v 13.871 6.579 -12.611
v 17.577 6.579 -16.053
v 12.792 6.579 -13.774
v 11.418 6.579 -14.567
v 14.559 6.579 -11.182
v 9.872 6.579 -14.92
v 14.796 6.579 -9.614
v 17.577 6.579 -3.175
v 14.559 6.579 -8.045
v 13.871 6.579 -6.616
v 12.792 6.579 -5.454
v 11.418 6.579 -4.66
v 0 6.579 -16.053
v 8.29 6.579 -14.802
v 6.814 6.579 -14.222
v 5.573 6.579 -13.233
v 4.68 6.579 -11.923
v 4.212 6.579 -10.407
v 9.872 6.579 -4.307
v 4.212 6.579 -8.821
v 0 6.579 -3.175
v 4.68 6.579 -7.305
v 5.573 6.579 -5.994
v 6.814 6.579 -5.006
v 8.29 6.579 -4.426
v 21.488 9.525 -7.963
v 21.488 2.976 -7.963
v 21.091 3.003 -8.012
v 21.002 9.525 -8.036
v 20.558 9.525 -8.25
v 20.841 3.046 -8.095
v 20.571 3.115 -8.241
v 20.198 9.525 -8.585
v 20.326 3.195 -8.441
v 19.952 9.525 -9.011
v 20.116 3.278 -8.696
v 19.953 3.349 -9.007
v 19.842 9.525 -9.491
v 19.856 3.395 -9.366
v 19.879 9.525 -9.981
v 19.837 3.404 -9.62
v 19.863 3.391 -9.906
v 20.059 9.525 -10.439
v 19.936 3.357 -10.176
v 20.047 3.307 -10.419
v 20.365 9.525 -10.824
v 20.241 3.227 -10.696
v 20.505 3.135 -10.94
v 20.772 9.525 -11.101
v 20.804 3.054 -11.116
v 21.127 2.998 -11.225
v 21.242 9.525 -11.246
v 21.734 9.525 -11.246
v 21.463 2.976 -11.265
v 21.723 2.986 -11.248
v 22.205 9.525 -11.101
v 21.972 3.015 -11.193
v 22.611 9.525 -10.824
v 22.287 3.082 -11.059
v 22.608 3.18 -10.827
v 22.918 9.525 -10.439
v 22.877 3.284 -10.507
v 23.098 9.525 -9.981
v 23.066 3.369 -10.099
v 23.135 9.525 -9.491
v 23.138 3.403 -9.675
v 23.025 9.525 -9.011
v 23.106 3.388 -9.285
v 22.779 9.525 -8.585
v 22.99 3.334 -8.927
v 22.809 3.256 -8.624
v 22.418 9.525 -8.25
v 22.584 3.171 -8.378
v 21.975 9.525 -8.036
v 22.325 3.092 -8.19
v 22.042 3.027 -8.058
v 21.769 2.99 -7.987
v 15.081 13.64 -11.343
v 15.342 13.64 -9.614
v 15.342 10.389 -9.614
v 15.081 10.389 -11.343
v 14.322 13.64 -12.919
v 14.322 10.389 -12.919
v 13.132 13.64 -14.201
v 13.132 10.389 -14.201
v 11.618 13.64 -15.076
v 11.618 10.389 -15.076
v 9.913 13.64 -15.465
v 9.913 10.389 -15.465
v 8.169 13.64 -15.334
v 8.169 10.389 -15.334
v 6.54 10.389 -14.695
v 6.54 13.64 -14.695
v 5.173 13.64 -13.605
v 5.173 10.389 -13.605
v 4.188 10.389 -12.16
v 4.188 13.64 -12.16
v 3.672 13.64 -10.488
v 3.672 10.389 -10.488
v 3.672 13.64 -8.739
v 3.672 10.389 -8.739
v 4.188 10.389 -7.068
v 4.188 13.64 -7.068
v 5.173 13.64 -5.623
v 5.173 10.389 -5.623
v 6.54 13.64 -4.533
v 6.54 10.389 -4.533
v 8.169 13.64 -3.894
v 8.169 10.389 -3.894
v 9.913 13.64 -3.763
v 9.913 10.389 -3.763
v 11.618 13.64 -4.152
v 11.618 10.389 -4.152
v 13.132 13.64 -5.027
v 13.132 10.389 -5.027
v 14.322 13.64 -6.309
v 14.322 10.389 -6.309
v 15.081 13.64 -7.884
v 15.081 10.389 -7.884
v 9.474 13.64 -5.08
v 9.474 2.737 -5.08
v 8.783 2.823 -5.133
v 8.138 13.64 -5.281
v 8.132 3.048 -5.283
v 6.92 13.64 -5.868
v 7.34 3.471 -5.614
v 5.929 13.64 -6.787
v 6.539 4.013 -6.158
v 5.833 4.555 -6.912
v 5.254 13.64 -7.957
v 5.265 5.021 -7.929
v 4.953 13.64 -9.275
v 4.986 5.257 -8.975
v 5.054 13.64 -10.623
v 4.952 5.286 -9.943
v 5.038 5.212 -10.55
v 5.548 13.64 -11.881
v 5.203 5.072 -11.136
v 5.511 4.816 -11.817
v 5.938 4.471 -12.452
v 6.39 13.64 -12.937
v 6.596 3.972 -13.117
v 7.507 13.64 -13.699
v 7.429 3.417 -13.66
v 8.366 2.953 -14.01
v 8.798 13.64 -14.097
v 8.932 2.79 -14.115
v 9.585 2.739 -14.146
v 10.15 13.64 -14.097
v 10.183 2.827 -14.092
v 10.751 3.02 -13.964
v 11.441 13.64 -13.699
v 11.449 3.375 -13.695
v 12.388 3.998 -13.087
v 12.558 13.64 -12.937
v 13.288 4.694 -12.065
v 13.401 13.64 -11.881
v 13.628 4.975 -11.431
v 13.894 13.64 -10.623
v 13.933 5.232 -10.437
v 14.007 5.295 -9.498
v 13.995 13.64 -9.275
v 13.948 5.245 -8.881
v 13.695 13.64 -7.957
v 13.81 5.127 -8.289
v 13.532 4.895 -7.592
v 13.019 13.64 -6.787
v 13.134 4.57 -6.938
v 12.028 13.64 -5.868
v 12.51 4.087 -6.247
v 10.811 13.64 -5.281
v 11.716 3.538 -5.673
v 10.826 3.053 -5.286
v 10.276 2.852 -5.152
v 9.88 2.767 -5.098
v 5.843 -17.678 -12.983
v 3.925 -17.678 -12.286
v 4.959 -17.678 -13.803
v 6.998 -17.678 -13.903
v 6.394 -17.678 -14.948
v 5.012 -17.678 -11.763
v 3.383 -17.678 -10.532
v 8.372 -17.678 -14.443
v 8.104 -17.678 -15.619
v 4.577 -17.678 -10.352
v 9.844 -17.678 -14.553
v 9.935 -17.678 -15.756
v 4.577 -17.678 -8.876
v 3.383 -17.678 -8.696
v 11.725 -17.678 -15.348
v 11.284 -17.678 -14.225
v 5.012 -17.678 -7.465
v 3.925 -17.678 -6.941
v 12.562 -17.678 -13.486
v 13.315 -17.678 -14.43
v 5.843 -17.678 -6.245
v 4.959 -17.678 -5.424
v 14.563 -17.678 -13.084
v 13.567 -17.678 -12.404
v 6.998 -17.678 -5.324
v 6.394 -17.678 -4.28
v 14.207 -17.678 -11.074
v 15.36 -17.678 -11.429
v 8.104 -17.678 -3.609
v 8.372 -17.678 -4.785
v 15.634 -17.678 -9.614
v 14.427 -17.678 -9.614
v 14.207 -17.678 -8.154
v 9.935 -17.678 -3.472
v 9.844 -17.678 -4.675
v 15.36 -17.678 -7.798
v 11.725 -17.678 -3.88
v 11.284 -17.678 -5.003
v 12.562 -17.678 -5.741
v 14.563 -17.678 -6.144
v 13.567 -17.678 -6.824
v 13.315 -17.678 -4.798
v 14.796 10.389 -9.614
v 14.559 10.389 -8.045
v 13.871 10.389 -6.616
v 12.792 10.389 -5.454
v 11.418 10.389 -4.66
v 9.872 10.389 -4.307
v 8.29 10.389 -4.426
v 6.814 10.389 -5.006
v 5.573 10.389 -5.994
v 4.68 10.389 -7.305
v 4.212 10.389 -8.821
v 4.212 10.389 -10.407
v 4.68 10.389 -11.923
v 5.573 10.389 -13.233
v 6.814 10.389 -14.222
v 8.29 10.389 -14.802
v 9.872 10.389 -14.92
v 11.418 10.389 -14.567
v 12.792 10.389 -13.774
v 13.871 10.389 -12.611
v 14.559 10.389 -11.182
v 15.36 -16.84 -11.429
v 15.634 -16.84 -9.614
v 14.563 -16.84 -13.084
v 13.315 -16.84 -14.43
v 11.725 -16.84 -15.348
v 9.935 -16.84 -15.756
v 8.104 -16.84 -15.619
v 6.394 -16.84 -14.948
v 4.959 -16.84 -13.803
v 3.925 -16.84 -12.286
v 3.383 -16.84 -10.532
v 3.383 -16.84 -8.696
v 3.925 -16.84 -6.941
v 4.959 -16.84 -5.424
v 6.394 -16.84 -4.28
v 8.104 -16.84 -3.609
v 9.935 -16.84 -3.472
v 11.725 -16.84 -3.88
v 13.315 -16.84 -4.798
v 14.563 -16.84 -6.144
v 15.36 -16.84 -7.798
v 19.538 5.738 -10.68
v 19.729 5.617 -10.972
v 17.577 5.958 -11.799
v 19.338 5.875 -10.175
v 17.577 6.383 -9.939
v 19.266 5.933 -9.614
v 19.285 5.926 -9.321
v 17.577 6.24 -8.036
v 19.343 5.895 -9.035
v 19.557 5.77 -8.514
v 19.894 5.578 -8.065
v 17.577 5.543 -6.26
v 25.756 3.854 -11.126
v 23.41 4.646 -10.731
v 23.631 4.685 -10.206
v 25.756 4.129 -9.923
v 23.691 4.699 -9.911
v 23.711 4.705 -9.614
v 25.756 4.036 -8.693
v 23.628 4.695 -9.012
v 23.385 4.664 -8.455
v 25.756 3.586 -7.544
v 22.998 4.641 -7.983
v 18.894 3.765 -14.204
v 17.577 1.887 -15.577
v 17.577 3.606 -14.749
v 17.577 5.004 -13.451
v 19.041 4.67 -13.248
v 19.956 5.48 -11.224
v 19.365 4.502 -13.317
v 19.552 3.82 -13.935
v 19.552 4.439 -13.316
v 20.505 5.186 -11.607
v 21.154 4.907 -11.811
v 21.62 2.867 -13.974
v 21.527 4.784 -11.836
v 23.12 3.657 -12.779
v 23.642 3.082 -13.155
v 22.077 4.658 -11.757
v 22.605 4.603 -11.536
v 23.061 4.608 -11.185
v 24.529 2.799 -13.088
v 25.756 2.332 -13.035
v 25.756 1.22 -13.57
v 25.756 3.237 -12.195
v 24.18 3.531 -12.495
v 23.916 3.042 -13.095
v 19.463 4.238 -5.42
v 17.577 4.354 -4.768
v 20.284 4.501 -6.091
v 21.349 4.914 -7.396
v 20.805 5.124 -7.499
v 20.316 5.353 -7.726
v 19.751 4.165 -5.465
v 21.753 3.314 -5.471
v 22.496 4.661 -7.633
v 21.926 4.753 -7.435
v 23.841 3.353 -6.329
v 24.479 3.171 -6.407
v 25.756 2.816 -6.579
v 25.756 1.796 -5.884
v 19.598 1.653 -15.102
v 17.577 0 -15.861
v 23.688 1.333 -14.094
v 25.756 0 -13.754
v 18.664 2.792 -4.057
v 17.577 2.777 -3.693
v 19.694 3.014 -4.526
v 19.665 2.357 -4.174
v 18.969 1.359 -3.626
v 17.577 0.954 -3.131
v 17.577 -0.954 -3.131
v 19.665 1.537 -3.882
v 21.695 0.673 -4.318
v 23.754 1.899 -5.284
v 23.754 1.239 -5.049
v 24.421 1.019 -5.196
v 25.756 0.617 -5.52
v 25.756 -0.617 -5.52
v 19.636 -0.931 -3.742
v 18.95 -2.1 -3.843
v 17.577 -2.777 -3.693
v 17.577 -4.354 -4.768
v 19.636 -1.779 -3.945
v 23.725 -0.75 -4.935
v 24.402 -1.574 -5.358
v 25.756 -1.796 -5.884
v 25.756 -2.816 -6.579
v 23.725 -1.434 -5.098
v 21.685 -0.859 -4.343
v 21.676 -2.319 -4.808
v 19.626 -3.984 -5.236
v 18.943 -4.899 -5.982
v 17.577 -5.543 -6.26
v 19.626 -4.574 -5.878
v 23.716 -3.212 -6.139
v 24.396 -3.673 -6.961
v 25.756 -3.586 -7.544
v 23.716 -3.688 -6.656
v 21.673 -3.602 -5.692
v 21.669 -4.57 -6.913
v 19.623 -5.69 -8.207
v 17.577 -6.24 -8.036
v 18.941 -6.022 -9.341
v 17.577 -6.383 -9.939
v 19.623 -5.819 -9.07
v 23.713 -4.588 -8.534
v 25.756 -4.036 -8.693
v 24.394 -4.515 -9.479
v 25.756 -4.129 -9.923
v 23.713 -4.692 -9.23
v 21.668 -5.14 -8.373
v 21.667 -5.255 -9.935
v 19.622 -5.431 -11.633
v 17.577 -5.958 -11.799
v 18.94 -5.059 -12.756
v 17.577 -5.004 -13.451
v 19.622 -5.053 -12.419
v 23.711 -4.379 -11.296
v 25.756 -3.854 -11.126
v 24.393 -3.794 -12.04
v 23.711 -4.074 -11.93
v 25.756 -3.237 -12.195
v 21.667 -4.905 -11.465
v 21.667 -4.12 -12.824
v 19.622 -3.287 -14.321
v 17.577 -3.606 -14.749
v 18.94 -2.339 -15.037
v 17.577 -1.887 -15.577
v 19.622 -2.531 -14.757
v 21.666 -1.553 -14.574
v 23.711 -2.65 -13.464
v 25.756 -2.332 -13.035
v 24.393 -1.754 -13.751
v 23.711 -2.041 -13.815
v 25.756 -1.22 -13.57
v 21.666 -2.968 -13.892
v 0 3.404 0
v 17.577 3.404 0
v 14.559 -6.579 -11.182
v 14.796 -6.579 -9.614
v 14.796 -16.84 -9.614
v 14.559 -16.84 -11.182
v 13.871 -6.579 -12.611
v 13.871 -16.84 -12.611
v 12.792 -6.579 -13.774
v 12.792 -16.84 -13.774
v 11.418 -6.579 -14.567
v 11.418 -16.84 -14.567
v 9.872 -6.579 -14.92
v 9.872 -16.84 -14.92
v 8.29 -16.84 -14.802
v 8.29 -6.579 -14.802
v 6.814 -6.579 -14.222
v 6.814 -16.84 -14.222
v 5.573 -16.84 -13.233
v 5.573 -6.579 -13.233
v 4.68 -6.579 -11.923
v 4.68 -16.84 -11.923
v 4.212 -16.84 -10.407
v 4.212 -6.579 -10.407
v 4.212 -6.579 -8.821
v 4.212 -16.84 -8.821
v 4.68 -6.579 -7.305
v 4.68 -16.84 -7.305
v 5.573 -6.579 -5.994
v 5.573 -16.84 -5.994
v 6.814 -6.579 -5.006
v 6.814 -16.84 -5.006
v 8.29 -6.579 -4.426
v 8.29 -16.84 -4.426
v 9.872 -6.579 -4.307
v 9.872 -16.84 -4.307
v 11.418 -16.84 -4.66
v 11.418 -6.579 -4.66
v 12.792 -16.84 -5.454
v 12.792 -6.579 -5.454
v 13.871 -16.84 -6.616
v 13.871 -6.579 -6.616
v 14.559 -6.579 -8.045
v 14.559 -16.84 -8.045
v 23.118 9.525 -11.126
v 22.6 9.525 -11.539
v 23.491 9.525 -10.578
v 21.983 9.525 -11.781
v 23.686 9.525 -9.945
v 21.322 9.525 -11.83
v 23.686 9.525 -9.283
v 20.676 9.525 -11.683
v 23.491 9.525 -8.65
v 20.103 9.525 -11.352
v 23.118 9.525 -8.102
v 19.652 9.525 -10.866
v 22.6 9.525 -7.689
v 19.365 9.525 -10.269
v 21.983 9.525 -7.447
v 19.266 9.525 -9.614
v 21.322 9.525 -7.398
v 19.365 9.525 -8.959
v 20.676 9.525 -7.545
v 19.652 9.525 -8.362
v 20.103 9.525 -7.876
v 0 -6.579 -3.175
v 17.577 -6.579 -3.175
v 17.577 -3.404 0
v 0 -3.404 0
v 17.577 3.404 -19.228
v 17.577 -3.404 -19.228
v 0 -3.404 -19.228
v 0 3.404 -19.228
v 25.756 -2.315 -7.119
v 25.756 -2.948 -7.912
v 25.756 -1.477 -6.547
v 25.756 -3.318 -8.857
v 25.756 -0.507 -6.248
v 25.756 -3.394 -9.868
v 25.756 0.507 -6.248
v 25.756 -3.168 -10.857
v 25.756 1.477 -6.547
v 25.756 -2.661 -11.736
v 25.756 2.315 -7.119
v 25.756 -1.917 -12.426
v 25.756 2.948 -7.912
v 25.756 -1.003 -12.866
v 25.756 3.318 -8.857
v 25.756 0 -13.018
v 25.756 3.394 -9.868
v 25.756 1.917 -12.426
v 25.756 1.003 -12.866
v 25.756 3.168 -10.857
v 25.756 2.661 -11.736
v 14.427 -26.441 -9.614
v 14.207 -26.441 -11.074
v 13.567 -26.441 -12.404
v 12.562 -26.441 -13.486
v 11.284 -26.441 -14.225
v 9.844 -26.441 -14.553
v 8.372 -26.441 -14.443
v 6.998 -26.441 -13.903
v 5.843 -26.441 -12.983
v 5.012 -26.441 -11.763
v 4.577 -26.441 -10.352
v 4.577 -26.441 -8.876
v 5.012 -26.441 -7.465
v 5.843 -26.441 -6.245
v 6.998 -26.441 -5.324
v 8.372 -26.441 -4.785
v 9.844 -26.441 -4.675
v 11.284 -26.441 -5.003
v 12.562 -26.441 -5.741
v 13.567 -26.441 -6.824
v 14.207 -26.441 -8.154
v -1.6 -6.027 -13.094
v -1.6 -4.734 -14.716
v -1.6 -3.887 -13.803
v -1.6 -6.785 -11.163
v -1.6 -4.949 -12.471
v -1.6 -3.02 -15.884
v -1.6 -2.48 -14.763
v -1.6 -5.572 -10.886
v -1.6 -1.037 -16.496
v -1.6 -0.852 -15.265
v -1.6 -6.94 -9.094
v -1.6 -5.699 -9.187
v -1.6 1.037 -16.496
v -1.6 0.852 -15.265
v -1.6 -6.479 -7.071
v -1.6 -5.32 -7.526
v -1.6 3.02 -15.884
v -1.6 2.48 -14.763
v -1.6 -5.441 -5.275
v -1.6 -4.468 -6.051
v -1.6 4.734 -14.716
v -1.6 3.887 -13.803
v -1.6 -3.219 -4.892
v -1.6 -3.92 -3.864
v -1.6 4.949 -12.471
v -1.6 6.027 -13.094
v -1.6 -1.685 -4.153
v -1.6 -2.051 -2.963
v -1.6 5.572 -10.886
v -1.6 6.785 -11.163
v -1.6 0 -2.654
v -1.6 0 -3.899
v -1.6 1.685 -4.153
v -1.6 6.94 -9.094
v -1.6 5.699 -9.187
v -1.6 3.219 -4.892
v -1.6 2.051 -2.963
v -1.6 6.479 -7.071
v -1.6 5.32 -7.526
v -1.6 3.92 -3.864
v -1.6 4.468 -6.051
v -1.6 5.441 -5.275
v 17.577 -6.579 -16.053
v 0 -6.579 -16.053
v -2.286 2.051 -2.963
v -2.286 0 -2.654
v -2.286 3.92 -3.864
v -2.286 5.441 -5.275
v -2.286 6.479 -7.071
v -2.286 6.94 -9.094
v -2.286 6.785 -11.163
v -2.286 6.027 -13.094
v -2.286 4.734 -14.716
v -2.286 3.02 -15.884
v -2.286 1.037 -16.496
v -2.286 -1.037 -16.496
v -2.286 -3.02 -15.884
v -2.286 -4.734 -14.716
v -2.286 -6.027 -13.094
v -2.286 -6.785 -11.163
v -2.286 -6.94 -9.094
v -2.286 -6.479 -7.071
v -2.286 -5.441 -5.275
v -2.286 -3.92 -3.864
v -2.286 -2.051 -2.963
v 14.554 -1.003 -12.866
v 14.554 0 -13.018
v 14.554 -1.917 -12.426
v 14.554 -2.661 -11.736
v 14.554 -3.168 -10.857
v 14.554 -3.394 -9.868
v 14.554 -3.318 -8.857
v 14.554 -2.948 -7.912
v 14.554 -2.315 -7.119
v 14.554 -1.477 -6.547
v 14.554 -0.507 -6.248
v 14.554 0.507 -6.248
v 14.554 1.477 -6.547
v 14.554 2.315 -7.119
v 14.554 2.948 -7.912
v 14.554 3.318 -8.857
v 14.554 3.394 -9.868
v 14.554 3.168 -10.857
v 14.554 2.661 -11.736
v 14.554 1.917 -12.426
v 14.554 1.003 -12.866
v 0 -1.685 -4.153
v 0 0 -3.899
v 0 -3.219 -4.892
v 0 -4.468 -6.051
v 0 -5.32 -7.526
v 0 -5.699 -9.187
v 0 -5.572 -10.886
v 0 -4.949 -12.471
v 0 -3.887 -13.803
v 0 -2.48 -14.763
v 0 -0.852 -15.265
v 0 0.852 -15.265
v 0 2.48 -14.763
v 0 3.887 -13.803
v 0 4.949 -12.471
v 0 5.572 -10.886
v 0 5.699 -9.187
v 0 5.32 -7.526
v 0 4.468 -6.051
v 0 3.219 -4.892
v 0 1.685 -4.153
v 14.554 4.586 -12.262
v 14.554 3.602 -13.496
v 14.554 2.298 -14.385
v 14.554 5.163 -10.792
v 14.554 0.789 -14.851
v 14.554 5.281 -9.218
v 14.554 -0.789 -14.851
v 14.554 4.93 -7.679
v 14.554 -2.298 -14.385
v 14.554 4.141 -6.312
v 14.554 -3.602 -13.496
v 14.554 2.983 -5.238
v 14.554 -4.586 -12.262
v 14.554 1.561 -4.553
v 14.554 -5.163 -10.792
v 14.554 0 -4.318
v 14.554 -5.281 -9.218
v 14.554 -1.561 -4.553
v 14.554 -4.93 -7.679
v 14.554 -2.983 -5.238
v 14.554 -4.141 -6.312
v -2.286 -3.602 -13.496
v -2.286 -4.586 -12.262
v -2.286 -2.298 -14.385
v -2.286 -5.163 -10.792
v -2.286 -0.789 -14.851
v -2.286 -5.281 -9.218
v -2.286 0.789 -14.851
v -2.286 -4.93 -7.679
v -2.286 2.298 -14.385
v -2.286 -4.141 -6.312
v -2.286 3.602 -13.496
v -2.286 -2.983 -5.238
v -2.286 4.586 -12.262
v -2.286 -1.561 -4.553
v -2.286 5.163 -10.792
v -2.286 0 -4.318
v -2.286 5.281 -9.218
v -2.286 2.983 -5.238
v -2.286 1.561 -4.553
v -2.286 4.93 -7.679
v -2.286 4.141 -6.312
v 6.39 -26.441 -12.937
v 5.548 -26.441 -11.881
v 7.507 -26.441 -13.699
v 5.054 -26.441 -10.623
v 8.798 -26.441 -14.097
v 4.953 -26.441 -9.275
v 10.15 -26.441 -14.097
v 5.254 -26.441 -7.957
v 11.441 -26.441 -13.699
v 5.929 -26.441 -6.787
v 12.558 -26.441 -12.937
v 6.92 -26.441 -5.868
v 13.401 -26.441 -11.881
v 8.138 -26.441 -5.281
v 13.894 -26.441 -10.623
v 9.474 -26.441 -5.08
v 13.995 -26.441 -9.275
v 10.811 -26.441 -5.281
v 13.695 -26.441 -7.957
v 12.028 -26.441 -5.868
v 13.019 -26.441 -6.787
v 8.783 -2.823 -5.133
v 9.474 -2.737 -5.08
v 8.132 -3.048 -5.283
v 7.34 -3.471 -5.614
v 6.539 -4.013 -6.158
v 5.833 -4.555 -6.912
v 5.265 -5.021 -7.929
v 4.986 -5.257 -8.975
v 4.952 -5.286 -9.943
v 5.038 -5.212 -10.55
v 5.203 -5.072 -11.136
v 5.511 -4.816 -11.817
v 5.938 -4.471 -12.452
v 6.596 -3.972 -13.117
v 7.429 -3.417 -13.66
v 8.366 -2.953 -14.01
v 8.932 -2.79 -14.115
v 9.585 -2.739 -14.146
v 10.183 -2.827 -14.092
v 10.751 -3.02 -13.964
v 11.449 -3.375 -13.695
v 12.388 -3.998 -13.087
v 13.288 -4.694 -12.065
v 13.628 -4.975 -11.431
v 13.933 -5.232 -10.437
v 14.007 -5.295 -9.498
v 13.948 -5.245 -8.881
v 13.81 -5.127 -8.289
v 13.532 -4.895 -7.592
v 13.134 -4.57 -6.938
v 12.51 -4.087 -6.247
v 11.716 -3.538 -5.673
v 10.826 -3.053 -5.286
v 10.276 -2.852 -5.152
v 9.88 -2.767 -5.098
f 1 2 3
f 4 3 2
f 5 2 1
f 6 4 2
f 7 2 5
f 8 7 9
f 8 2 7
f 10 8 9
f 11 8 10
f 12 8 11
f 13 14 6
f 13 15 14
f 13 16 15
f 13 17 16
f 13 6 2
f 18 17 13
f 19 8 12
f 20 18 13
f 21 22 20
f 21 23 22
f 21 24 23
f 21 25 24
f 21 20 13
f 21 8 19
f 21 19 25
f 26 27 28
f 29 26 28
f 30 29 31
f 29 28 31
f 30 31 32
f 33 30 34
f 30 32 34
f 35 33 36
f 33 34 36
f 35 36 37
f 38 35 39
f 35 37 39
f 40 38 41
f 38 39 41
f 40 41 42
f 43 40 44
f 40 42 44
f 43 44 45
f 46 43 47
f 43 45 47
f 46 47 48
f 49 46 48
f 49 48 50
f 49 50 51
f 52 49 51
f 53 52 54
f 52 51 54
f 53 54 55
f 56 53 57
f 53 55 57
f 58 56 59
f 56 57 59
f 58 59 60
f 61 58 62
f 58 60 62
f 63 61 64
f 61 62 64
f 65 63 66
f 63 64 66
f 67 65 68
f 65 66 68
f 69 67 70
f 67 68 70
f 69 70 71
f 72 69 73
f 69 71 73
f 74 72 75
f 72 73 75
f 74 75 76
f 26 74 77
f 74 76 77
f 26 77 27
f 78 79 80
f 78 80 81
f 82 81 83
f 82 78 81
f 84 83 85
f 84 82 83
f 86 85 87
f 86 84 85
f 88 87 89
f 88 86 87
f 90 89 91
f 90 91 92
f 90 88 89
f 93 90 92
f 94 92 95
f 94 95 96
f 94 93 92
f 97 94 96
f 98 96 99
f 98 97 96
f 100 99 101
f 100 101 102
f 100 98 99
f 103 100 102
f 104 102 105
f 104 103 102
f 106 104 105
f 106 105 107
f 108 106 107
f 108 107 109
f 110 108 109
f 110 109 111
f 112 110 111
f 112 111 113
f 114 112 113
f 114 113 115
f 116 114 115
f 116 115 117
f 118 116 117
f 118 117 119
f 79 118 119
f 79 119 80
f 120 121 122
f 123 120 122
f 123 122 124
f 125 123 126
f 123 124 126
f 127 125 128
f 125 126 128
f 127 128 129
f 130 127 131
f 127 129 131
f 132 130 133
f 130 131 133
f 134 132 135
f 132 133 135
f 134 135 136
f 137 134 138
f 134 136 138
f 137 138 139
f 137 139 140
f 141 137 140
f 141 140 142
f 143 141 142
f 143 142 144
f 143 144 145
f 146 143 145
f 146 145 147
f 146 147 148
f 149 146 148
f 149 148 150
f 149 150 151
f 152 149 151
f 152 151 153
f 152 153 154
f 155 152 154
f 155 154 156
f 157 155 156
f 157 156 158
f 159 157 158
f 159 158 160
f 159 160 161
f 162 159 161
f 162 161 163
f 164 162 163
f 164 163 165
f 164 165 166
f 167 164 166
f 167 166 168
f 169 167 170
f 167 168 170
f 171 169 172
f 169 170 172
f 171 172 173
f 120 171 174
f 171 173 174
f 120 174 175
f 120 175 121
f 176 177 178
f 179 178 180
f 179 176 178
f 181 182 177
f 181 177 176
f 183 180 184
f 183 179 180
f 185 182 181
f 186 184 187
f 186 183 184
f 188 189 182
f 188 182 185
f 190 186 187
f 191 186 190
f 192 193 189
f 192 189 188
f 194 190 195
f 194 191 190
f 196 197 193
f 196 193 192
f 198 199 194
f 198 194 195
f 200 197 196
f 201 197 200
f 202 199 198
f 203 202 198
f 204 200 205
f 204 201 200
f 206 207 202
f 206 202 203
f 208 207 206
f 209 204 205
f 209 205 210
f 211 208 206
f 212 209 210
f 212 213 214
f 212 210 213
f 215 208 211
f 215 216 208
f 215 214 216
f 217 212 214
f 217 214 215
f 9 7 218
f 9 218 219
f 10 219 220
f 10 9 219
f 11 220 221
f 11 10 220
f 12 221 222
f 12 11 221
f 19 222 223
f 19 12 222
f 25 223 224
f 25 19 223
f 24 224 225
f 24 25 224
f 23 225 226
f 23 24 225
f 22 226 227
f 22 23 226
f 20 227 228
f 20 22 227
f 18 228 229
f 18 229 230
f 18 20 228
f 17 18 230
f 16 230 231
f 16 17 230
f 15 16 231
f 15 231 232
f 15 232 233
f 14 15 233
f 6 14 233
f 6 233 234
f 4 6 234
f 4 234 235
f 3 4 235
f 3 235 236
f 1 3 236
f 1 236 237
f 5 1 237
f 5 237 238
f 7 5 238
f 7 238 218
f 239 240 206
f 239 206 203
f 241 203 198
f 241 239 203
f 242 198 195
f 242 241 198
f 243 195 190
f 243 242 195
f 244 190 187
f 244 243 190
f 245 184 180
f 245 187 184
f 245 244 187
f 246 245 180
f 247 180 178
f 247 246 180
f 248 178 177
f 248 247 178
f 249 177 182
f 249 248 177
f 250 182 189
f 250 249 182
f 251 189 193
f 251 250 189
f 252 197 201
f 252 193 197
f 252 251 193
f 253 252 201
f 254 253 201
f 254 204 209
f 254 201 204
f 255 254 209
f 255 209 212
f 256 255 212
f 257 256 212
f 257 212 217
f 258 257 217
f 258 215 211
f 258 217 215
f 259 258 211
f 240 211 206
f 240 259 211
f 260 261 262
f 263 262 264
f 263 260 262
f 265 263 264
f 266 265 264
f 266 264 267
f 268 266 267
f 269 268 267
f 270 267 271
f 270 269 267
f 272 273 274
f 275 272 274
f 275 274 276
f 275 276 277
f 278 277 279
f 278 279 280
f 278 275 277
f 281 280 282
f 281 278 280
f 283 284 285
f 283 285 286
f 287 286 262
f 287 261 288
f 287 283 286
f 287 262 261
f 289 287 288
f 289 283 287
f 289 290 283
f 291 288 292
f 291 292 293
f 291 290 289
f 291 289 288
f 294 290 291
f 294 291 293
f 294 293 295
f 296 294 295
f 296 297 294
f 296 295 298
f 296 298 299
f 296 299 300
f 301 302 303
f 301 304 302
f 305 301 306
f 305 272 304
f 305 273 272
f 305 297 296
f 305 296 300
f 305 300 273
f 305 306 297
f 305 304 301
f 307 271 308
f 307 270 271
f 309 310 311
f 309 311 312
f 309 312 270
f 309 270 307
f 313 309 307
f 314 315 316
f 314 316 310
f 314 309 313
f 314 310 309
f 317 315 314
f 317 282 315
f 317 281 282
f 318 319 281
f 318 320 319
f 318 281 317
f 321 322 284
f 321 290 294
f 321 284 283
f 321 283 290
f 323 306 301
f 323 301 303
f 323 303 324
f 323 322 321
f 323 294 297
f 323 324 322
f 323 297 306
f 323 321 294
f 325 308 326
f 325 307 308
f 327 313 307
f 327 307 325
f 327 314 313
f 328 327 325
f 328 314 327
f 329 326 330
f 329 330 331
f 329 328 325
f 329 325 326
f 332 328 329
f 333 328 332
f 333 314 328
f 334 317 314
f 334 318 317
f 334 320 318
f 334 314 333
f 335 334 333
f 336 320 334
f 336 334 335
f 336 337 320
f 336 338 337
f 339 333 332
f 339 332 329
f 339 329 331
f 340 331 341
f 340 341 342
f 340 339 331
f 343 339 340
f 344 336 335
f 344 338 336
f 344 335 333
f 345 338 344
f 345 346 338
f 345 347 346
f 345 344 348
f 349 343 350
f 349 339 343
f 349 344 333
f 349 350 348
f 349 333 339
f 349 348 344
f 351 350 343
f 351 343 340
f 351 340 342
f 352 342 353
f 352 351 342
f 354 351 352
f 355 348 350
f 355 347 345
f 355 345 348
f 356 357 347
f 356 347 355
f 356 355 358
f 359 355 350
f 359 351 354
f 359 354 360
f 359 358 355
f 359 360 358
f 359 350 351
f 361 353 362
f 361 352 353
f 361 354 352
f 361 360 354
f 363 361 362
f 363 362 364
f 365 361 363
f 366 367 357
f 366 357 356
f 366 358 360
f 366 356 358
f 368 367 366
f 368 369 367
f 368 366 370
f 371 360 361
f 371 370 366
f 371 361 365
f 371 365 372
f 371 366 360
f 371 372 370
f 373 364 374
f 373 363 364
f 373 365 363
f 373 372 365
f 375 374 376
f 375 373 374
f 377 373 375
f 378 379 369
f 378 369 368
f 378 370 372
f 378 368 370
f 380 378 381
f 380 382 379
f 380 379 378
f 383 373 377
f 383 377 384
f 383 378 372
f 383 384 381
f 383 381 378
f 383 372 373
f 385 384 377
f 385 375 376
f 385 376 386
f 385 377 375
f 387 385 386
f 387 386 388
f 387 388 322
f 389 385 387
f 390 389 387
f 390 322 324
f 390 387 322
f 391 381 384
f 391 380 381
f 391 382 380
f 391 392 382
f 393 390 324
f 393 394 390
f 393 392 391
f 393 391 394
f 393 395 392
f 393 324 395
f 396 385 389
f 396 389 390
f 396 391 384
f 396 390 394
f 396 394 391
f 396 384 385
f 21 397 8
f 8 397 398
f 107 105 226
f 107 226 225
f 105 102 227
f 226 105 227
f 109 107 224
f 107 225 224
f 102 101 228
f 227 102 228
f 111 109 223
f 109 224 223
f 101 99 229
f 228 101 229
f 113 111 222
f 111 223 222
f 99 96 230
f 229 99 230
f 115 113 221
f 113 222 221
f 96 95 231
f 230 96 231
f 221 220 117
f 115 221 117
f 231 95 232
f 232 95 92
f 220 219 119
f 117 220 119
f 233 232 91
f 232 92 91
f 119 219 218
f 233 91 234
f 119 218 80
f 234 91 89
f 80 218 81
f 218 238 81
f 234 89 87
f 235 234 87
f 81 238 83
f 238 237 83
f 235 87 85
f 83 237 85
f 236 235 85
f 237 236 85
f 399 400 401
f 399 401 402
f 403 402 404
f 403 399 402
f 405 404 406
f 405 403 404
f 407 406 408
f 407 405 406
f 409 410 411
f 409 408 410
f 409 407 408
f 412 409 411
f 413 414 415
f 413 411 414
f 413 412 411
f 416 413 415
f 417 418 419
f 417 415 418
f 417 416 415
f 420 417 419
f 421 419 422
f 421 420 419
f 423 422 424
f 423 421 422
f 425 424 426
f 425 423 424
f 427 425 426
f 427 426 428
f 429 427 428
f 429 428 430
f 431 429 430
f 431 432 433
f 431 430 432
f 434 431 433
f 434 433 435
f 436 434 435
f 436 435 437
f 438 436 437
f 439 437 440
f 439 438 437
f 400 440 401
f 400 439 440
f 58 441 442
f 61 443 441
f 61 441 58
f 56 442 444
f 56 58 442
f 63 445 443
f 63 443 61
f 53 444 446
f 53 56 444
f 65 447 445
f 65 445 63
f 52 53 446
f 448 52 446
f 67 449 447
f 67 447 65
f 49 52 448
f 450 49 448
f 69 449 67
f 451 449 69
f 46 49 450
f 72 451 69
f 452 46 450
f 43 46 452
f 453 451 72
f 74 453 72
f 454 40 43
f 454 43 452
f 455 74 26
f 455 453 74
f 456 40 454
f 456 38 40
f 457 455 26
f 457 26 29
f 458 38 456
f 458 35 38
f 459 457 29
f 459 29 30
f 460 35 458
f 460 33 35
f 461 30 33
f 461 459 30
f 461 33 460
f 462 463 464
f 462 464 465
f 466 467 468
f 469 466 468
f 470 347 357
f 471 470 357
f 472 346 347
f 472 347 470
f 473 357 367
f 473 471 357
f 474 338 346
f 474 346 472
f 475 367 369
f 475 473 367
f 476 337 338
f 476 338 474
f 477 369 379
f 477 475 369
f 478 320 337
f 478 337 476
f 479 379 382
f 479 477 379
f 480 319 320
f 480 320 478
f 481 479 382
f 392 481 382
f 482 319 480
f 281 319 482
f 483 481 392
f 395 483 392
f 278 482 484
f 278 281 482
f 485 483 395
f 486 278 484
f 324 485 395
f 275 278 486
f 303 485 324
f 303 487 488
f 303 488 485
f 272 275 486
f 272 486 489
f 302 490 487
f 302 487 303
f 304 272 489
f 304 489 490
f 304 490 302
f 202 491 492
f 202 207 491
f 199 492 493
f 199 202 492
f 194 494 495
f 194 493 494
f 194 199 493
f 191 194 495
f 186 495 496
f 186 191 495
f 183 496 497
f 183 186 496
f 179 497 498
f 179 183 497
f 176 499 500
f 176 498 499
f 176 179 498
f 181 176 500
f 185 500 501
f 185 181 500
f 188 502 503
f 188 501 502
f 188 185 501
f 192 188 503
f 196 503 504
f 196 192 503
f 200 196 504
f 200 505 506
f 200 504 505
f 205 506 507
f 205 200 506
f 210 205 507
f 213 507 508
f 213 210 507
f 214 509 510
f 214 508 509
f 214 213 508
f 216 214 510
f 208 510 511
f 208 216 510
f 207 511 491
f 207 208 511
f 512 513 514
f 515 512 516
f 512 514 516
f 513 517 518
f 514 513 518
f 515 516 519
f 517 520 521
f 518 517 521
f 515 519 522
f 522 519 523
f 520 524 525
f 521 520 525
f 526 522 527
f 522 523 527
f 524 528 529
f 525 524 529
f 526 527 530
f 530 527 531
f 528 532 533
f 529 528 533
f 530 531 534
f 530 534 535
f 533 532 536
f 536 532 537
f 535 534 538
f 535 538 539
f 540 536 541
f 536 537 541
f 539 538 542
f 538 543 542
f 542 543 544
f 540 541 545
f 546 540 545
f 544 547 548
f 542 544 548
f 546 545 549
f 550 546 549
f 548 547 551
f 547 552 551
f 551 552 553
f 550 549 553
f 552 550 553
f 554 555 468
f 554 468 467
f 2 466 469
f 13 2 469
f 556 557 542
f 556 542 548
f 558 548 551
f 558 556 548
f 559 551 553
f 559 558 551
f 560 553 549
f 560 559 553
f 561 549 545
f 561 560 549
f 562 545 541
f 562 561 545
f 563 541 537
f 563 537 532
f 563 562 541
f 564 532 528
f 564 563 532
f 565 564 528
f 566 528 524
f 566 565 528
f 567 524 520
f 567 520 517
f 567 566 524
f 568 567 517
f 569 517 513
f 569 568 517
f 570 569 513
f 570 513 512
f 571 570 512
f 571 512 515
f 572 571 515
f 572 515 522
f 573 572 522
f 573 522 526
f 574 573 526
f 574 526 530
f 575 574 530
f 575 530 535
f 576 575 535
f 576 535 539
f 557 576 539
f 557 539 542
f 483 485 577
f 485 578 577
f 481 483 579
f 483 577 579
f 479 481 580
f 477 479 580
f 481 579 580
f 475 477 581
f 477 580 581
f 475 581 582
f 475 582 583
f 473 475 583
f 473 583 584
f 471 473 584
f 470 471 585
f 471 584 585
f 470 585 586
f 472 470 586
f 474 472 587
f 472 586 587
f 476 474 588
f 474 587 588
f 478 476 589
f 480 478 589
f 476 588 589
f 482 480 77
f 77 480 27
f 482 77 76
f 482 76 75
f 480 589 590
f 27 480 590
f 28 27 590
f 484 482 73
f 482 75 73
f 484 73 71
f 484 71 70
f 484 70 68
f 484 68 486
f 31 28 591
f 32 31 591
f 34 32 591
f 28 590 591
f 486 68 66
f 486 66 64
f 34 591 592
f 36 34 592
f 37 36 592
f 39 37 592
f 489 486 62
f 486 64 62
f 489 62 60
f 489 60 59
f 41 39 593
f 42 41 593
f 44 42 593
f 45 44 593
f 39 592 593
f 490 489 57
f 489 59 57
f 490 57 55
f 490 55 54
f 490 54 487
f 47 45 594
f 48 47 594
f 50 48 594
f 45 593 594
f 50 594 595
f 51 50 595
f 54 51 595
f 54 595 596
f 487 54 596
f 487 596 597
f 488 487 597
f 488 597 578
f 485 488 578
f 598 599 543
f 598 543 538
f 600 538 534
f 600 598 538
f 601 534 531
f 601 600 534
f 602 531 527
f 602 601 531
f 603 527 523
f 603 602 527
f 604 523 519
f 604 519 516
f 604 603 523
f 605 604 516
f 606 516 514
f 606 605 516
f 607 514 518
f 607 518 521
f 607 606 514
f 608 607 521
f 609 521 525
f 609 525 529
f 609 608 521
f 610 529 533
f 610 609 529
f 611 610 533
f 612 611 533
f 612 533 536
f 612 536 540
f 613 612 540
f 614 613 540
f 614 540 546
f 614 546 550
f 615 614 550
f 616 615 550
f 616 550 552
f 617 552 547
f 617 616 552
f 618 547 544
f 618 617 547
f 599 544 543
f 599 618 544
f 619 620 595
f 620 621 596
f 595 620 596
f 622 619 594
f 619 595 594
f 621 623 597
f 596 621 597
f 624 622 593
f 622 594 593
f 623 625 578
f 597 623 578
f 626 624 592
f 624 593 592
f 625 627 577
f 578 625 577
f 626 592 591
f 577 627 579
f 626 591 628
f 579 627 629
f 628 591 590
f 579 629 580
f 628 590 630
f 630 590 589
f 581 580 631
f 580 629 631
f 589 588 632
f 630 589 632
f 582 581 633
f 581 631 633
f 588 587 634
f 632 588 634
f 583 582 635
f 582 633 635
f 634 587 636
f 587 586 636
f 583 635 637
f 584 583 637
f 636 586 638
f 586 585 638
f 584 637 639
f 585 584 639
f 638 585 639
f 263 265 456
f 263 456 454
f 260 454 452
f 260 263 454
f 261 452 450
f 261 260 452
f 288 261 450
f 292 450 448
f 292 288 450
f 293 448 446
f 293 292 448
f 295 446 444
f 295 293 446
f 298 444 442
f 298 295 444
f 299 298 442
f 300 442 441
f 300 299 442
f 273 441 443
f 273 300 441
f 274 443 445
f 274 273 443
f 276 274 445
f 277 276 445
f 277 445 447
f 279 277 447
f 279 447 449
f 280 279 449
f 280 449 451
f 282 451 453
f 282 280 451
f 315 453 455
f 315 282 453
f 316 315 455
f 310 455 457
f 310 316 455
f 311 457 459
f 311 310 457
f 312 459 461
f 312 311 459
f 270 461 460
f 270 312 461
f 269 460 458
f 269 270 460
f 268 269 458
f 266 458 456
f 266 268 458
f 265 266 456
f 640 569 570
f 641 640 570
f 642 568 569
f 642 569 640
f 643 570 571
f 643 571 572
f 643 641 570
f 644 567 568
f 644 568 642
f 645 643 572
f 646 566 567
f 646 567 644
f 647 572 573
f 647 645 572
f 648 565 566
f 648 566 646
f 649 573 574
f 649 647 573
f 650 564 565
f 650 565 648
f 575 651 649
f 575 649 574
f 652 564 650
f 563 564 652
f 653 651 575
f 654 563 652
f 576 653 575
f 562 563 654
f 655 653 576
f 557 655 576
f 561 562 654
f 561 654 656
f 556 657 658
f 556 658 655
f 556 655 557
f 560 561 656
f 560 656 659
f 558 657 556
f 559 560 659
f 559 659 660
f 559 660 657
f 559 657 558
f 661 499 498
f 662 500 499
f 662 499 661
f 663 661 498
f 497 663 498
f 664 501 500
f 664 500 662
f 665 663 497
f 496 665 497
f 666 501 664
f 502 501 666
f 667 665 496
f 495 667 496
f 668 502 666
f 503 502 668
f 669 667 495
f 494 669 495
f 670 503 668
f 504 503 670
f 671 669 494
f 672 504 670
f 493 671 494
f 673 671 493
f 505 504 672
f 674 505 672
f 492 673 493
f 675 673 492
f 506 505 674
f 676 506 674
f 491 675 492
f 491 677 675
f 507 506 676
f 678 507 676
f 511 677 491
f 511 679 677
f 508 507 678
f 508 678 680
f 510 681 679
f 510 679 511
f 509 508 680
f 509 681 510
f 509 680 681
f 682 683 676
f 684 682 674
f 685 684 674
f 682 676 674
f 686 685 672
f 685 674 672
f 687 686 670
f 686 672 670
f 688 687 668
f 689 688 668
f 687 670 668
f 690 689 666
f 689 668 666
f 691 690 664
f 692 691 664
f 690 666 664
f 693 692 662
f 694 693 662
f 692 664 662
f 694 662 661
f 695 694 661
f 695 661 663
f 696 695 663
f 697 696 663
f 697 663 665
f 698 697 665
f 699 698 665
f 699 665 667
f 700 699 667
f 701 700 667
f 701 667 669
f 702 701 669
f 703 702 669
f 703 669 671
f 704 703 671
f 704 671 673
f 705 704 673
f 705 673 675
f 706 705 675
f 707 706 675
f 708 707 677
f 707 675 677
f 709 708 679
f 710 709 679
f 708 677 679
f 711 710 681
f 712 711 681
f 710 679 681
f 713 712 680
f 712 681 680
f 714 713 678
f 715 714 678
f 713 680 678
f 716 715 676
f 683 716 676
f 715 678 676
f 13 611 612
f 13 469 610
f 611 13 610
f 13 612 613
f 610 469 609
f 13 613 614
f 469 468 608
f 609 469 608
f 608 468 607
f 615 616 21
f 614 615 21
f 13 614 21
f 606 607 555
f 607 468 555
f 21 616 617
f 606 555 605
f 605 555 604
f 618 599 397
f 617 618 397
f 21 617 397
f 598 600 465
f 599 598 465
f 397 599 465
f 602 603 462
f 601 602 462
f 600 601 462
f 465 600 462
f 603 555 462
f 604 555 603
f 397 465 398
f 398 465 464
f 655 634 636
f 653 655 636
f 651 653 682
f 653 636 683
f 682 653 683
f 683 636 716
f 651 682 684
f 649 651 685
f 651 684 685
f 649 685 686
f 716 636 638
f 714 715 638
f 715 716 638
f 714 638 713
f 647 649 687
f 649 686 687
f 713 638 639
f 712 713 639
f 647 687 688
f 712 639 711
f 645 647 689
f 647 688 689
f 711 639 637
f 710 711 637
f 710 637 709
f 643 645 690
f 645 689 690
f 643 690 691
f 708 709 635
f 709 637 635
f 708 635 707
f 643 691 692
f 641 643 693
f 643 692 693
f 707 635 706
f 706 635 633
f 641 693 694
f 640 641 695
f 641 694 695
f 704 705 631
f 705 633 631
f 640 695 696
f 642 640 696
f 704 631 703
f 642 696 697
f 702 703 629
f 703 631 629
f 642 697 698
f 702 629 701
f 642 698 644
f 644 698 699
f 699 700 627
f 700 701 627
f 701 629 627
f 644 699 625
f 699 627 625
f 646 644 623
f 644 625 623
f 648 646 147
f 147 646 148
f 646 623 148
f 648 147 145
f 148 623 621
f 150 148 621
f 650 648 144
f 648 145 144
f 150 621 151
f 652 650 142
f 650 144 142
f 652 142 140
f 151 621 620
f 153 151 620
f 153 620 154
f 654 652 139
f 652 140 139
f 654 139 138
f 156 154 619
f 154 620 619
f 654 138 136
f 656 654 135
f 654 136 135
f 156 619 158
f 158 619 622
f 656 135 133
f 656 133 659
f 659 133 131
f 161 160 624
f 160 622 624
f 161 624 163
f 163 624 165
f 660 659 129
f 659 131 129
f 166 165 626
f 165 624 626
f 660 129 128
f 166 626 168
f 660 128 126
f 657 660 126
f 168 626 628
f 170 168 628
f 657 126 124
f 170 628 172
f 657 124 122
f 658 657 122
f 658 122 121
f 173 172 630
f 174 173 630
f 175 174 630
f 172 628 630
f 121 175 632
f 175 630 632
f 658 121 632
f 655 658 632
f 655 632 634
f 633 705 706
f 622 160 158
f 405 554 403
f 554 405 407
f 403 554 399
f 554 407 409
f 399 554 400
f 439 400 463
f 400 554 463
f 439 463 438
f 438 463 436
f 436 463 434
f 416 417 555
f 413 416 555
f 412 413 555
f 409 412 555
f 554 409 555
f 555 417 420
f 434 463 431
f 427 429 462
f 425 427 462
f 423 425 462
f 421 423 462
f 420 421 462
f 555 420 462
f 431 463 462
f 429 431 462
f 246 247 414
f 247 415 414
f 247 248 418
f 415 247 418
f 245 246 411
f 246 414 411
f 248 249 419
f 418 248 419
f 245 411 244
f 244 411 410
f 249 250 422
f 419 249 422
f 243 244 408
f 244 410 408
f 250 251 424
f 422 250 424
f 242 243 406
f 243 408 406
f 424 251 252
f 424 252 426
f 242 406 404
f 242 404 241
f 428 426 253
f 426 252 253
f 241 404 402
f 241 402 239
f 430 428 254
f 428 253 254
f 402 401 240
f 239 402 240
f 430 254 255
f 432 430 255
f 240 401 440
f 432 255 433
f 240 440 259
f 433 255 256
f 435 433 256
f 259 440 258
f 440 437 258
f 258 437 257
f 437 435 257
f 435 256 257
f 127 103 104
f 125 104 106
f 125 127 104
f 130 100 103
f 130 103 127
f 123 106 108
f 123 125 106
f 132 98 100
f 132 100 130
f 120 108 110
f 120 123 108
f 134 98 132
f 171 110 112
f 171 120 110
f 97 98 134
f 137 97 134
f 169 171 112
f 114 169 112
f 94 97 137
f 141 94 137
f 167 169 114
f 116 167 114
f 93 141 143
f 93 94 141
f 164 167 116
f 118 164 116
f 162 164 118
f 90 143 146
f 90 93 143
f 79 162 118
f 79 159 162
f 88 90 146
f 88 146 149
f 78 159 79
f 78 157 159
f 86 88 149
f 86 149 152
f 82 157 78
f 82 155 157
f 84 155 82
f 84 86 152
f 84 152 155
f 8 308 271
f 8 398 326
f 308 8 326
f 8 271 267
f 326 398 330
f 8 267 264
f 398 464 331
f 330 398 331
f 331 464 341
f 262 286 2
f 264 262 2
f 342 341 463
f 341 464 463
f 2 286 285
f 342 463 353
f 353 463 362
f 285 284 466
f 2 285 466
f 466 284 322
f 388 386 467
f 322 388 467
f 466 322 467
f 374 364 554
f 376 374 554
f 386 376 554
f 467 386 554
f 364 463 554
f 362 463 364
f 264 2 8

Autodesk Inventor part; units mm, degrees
ref_plane "YZ Plane" through (0, 0, 0) normal (1, 0, 0) x (0, 1, 0)
sketch "Sketch1" plane through (0, 0, 0) normal (0, 1, 0) x (-1, 0, 0)
  line L0 (0, 0) -> (-17.5768, 0)
  line L1 (-17.5768, 0) -> (-17.5768, -19.2278)
  line L2 (-17.5768, -19.2278) -> (0, -19.2278)
  line L3 (0, -19.2278) -> (0, 0)
  dimension "d0" = 17.5768
  dimension "d1" = 19.2278
extrude "Extrusion1" add sketch "Sketch1" along normal mid plane 13.1572
sketch "Sketch4" plane through (0, -6.5786, 0) normal (0, -1, 0) x (1, 0, 0)
  line L0 (17.5768, 0) -> (17.5768, -19.2278) projected
  circle A0 centre (9.4742, -9.6139) radius 5.3213
  point P0 (0, 0)
  dimension "d12" = 10.6426
extrude "Extrusion4" add sketch "Sketch4" along normal blind 10.2616
sketch "Sketch5" plane through (9.4742, -16.8402, -9.6139) normal (0, -1, 0) x (1, 0, 0)
  circle A0 centre (0, 0) radius 6.1595
  point P0 (-9.4742, 9.6139)
  dimension "d15" = 12.319
extrude "Extrusion5" add sketch "Sketch5" along normal blind 0.8382
sketch "Sketch2" plane through (0, 6.5786, 0) normal (0, 1, 0) x (1, 0, 0)
  line L0 (0, 19.2278) -> (0, 0) projected
  line L1 (17.5768, 19.2278) -> (0, 19.2278) projected
  line L2 (0, 0) -> (17.5768, 0) projected
  line L3 (17.5768, 0) -> (17.5768, 19.2278) projected
  line L4 (17.5768, 0) -> (9.4742, 0)
  circle A0 centre (9.4742, 9.6139) radius 5.3213
  dimension "d4" = 8.1026
  dimension "d5" = 10.6426
extrude "Extrusion2" add sketch "Sketch2" along normal blind 7.0612 contours A0
sketch "Sketch3" plane through (9.4742, 13.6398, -9.6139) normal (0, 1, 0) x (1, 0, 0)
  circle A0 centre (0, 0) radius 5.8674
  point P0 (-9.4742, -9.6139)
  dimension "d8" = 11.7348
extrude "Extrusion3" add sketch "Sketch3" against normal blind 3.2512
sketch "Sketch7" plane through (0, -6.5786, 0) normal (-1, 0, 0) x (0, 0, 1)
  line L0 (-19.2278, 13.1572) -> (0, 0) construction
  line L1 (-19.2278, 0) -> (-19.2278, 13.1572) projected
  line L2 (-19.2278, 6.5786) -> (-9.6139, 6.5786) construction
  circle A0 centre (-9.6139, 6.5786) radius 5.715
  point P0 (0, 6.5786)
  dimension "d21" = 11.43
extrude "Extrusion7" add sketch "Sketch7" along normal blind 2.286
sketch "Sketch8" plane through (-2.286, 0, -9.6139) normal (-1, 0, 0) x (0, 0, 1)
  circle A0 centre (0, 0) radius 6.9596
  point P0 (9.6139, 0)
  dimension "d24" = 13.9192
extrude "Extrusion8" add sketch "Sketch8" against normal blind 0.6858
sketch "Sketch6" plane through (9.4742, -17.6784, -9.6139) normal (0, -1, 0) x (1, 0, 0)
  circle A0 centre (0, 0) radius 4.953
  point P0 (-9.4742, 9.6139)
  dimension "d18" = 9.906
extrude "Extrusion6" add sketch "Sketch6" along normal blind 8.763
sketch "Sketch9" plane through (0, 0, 0) normal (0, 0, 1) x (1, 0, 0)
  point P0 (0, 0)
ref_plane "Work Plane1" through (0, 6.5786, -9.6139) normal (0, 0, 1) x (1, 0, 0)
sketch "Sketch11" plane through (0, 0, 0) normal (0, 1, 0) x (-1, 0, 0)
  line L0 (-25.7556, -5.4737) -> (-25.7556, -13.7541) projected
  line L1 (-25.7556, -9.6139) -> (-21.4884, -9.6139)
  circle A0 centre (-21.4884, -9.6139) radius 2.2225
  point P0 (0, 0)
  dimension "d31" = 4.2672
  dimension "d32" = 4.445
extrude "Extrusion9" add sketch "Sketch11" along normal blind 9.525
ref_plane "Work Plane3" through (25.7556, -6.5786, -19.2278) normal (1, 0, 0) x (0, 0, -1)
sketch "Sketch12" plane through (17.5768, -6.5786, -19.2278) normal (1, 0, 0) x (0, 0, -1)
  point P0 (-19.2278, 6.5786)
sketch "Sketch13" plane through (17.5768, -6.5786, -19.2278) normal (1, 0, 0) x (0, 0, -1)
  circle A0 centre (-9.7674, 6.5786) radius 6.4008
  point P0 (-19.2278, 6.5786)
  dimension "d36" = 12.8016
sketch "Sketch14" plane through (25.7556, -6.5786, -19.2278) normal (1, 0, 0) x (0, 0, -1)
  line L0 (-11.8364, 6.5786) -> (-7.3914, 6.5786) projected
  circle A0 centre (-9.6139, 6.5786) radius 4.1402
  point P0 (-19.2278, 6.5786)
  dimension "d37" = 8.2804
loft "Loft1" add profiles "Sketch13", "Sketch14"
chamfer "Chamfer1" distance 3.175 angle 45 4 edges at (8.7884, 6.5786, -19.2278) (8.7884, -6.5786, -19.2278) (8.7884, -6.5786, 0) (8.7884, 6.5786, 0)
hole "Hole1" at (-2.286, 0, -9.6139) direction (1, 0, 0) diameter 10.5918 depth 16.8402
hole "Hole2" at (9.4742, 13.6398, -9.6139) direction (0, -1, 0) diameter 9.0678 end through all
hole "Hole3" at (25.7556, 0, -9.6139) direction (-1, 0, 0) diameter 6.8072 end through all
hole "Hole4" at (21.4884, 9.525, -9.6139) direction (0, -1, 0) diameter 3.302 depth 10.16 tip angle 118 thread size "8-32 UNC" class "2B" standard "ANSI Unified Screw Threads"
properties part number "Carburetor Housing" material "Lead"
